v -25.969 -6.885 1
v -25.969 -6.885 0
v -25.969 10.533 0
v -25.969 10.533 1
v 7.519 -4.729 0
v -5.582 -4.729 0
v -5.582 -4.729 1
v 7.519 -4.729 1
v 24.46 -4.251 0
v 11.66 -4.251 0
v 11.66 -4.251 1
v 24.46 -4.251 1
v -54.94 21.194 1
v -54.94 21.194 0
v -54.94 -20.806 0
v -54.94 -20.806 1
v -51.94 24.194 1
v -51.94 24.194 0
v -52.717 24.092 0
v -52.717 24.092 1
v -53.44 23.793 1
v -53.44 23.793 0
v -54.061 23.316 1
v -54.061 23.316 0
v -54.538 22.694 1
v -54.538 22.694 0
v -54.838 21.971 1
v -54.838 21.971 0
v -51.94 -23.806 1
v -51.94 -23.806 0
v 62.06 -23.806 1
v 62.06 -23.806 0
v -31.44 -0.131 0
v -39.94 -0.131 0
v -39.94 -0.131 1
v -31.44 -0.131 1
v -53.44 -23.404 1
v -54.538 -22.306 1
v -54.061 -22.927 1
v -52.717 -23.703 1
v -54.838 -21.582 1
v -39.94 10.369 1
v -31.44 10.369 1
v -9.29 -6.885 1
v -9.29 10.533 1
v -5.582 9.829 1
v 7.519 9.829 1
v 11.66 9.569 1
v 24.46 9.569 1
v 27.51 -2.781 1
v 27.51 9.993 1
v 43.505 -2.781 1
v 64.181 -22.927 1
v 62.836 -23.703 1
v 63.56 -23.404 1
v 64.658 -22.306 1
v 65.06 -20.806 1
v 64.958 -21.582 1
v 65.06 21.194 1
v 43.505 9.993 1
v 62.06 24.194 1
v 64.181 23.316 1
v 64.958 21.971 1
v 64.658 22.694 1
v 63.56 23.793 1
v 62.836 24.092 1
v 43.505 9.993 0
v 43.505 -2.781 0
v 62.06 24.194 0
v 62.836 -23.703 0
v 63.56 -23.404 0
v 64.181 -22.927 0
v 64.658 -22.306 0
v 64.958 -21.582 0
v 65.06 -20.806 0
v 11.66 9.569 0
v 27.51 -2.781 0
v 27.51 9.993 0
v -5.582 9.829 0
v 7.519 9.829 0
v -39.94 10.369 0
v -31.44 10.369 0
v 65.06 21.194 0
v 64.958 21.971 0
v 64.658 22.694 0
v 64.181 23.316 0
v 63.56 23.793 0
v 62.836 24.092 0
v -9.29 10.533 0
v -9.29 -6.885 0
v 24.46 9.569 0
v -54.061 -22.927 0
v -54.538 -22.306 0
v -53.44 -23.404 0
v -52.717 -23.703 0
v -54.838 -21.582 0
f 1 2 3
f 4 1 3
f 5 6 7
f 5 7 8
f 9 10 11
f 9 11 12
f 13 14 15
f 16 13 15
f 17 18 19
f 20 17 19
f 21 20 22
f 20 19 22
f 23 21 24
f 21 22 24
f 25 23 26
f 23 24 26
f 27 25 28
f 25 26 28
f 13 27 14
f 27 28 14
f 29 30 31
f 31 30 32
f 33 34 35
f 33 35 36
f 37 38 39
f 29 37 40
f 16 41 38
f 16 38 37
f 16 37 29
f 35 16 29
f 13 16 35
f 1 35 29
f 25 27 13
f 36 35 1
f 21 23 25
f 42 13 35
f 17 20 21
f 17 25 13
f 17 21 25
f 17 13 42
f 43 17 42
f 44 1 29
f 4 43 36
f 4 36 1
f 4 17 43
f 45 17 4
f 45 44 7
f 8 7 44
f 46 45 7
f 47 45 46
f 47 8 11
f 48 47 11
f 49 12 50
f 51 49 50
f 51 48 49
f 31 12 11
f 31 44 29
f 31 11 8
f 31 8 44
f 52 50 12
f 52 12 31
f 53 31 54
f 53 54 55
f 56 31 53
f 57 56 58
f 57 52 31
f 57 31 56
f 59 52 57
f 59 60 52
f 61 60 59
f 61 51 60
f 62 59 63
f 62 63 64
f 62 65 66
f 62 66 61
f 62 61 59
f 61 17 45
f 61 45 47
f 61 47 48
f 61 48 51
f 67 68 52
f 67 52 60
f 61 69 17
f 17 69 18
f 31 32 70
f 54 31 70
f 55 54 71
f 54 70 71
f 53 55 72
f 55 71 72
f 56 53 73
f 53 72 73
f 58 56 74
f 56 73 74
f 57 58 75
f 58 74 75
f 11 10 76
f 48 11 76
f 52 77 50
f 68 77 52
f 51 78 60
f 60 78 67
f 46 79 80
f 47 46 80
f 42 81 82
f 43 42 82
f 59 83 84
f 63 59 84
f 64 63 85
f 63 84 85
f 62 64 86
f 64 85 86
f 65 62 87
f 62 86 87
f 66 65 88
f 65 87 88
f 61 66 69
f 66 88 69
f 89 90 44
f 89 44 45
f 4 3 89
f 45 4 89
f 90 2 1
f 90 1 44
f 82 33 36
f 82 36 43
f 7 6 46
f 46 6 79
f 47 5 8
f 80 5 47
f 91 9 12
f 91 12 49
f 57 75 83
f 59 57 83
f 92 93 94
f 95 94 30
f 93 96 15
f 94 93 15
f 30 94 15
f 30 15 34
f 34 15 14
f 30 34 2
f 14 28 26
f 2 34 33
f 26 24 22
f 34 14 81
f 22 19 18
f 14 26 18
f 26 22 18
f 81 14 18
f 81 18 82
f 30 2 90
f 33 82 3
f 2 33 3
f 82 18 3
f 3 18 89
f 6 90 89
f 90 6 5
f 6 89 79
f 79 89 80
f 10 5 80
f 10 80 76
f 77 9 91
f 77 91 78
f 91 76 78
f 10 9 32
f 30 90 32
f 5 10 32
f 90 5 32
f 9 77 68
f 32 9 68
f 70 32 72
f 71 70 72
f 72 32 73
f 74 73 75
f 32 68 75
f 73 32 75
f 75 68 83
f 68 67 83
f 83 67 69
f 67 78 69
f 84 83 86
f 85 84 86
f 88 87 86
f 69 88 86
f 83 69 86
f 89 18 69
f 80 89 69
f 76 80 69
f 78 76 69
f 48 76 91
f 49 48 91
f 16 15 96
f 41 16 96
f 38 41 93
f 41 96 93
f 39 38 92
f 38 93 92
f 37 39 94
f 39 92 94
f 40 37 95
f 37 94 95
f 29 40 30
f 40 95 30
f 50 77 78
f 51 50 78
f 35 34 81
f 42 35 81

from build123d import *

# Parameters (mm, degrees)
SKETCH1_W           = 13.101477715
SKETCH1_H           = 14.558194743
SKETCH1_W_2         = 8.5
SKETCH1_H_2         = 10.5
SKETCH1_W_3         = 16.678859494
SKETCH1_H_3         = 17.418317903
SKETCH1_W_4         = 15.995214615
SKETCH1_H_4         = 12.7738
SKETCH1_W_5         = 12.8
SKETCH1_H_5         = 13.82
BOSS_EXTRUDE1_DEPTH = 1


with BuildPart() as part:
    # Sketch1 → Boss-Extrude1 (new body)
    with BuildSketch(Plane.XY):
        with BuildLine():
            Line((-51.940144553, -23.805569529), (62.059855447, -23.805569529))
            ThreePointArc((62.059855447, -23.805569529), (64.18117579, -22.926889873), (65.059855447, -20.805569529))
            Line((65.059855447, -20.805569529), (65.059855447, 0.194430471))
            Line((65.059855447, 0.194430471), (65.059855447, 21.194430471))
            ThreePointArc((65.059855447, 21.194430471), (64.18117579, 23.315750814), (62.059855447, 24.194430471))
            Line((62.059855447, 24.194430471), (-51.940144553, 24.194430471))
            ThreePointArc((-51.940144553, 24.194430471), (-54.061464897, 23.315750814), (-54.940144553, 21.194430471))
            Line((-54.940144553, 21.194430471), (-54.940144553, 0.194430471))
            Line((-54.940144553, 0.194430471), (-54.940144553, -20.805569529))
            ThreePointArc((-54.940144553, -20.805569529), (-54.061464897, -22.926889873), (-51.940144553, -23.805569529))
        make_face()
        with Locations((0.968394625, 2.55037109)):
            Rectangle(SKETCH1_W, SKETCH1_H, mode=Mode.SUBTRACT)
        with Locations((-35.690144553, 5.119430471)):
            Rectangle(SKETCH1_W_2, SKETCH1_H_2, mode=Mode.SUBTRACT)
        with Locations((-17.6295743, 1.82407152)):
            Rectangle(SKETCH1_W_3, SKETCH1_H_3, mode=Mode.SUBTRACT)
        with Locations((35.50746287, 3.606330471)):
            Rectangle(SKETCH1_W_4, SKETCH1_H_4, mode=Mode.SUBTRACT)
        with Locations((18.059855447, 2.659430471)):
            Rectangle(SKETCH1_W_5, SKETCH1_H_5, mode=Mode.SUBTRACT)
    extrude(amount=BOSS_EXTRUDE1_DEPTH)


solid = part.part
